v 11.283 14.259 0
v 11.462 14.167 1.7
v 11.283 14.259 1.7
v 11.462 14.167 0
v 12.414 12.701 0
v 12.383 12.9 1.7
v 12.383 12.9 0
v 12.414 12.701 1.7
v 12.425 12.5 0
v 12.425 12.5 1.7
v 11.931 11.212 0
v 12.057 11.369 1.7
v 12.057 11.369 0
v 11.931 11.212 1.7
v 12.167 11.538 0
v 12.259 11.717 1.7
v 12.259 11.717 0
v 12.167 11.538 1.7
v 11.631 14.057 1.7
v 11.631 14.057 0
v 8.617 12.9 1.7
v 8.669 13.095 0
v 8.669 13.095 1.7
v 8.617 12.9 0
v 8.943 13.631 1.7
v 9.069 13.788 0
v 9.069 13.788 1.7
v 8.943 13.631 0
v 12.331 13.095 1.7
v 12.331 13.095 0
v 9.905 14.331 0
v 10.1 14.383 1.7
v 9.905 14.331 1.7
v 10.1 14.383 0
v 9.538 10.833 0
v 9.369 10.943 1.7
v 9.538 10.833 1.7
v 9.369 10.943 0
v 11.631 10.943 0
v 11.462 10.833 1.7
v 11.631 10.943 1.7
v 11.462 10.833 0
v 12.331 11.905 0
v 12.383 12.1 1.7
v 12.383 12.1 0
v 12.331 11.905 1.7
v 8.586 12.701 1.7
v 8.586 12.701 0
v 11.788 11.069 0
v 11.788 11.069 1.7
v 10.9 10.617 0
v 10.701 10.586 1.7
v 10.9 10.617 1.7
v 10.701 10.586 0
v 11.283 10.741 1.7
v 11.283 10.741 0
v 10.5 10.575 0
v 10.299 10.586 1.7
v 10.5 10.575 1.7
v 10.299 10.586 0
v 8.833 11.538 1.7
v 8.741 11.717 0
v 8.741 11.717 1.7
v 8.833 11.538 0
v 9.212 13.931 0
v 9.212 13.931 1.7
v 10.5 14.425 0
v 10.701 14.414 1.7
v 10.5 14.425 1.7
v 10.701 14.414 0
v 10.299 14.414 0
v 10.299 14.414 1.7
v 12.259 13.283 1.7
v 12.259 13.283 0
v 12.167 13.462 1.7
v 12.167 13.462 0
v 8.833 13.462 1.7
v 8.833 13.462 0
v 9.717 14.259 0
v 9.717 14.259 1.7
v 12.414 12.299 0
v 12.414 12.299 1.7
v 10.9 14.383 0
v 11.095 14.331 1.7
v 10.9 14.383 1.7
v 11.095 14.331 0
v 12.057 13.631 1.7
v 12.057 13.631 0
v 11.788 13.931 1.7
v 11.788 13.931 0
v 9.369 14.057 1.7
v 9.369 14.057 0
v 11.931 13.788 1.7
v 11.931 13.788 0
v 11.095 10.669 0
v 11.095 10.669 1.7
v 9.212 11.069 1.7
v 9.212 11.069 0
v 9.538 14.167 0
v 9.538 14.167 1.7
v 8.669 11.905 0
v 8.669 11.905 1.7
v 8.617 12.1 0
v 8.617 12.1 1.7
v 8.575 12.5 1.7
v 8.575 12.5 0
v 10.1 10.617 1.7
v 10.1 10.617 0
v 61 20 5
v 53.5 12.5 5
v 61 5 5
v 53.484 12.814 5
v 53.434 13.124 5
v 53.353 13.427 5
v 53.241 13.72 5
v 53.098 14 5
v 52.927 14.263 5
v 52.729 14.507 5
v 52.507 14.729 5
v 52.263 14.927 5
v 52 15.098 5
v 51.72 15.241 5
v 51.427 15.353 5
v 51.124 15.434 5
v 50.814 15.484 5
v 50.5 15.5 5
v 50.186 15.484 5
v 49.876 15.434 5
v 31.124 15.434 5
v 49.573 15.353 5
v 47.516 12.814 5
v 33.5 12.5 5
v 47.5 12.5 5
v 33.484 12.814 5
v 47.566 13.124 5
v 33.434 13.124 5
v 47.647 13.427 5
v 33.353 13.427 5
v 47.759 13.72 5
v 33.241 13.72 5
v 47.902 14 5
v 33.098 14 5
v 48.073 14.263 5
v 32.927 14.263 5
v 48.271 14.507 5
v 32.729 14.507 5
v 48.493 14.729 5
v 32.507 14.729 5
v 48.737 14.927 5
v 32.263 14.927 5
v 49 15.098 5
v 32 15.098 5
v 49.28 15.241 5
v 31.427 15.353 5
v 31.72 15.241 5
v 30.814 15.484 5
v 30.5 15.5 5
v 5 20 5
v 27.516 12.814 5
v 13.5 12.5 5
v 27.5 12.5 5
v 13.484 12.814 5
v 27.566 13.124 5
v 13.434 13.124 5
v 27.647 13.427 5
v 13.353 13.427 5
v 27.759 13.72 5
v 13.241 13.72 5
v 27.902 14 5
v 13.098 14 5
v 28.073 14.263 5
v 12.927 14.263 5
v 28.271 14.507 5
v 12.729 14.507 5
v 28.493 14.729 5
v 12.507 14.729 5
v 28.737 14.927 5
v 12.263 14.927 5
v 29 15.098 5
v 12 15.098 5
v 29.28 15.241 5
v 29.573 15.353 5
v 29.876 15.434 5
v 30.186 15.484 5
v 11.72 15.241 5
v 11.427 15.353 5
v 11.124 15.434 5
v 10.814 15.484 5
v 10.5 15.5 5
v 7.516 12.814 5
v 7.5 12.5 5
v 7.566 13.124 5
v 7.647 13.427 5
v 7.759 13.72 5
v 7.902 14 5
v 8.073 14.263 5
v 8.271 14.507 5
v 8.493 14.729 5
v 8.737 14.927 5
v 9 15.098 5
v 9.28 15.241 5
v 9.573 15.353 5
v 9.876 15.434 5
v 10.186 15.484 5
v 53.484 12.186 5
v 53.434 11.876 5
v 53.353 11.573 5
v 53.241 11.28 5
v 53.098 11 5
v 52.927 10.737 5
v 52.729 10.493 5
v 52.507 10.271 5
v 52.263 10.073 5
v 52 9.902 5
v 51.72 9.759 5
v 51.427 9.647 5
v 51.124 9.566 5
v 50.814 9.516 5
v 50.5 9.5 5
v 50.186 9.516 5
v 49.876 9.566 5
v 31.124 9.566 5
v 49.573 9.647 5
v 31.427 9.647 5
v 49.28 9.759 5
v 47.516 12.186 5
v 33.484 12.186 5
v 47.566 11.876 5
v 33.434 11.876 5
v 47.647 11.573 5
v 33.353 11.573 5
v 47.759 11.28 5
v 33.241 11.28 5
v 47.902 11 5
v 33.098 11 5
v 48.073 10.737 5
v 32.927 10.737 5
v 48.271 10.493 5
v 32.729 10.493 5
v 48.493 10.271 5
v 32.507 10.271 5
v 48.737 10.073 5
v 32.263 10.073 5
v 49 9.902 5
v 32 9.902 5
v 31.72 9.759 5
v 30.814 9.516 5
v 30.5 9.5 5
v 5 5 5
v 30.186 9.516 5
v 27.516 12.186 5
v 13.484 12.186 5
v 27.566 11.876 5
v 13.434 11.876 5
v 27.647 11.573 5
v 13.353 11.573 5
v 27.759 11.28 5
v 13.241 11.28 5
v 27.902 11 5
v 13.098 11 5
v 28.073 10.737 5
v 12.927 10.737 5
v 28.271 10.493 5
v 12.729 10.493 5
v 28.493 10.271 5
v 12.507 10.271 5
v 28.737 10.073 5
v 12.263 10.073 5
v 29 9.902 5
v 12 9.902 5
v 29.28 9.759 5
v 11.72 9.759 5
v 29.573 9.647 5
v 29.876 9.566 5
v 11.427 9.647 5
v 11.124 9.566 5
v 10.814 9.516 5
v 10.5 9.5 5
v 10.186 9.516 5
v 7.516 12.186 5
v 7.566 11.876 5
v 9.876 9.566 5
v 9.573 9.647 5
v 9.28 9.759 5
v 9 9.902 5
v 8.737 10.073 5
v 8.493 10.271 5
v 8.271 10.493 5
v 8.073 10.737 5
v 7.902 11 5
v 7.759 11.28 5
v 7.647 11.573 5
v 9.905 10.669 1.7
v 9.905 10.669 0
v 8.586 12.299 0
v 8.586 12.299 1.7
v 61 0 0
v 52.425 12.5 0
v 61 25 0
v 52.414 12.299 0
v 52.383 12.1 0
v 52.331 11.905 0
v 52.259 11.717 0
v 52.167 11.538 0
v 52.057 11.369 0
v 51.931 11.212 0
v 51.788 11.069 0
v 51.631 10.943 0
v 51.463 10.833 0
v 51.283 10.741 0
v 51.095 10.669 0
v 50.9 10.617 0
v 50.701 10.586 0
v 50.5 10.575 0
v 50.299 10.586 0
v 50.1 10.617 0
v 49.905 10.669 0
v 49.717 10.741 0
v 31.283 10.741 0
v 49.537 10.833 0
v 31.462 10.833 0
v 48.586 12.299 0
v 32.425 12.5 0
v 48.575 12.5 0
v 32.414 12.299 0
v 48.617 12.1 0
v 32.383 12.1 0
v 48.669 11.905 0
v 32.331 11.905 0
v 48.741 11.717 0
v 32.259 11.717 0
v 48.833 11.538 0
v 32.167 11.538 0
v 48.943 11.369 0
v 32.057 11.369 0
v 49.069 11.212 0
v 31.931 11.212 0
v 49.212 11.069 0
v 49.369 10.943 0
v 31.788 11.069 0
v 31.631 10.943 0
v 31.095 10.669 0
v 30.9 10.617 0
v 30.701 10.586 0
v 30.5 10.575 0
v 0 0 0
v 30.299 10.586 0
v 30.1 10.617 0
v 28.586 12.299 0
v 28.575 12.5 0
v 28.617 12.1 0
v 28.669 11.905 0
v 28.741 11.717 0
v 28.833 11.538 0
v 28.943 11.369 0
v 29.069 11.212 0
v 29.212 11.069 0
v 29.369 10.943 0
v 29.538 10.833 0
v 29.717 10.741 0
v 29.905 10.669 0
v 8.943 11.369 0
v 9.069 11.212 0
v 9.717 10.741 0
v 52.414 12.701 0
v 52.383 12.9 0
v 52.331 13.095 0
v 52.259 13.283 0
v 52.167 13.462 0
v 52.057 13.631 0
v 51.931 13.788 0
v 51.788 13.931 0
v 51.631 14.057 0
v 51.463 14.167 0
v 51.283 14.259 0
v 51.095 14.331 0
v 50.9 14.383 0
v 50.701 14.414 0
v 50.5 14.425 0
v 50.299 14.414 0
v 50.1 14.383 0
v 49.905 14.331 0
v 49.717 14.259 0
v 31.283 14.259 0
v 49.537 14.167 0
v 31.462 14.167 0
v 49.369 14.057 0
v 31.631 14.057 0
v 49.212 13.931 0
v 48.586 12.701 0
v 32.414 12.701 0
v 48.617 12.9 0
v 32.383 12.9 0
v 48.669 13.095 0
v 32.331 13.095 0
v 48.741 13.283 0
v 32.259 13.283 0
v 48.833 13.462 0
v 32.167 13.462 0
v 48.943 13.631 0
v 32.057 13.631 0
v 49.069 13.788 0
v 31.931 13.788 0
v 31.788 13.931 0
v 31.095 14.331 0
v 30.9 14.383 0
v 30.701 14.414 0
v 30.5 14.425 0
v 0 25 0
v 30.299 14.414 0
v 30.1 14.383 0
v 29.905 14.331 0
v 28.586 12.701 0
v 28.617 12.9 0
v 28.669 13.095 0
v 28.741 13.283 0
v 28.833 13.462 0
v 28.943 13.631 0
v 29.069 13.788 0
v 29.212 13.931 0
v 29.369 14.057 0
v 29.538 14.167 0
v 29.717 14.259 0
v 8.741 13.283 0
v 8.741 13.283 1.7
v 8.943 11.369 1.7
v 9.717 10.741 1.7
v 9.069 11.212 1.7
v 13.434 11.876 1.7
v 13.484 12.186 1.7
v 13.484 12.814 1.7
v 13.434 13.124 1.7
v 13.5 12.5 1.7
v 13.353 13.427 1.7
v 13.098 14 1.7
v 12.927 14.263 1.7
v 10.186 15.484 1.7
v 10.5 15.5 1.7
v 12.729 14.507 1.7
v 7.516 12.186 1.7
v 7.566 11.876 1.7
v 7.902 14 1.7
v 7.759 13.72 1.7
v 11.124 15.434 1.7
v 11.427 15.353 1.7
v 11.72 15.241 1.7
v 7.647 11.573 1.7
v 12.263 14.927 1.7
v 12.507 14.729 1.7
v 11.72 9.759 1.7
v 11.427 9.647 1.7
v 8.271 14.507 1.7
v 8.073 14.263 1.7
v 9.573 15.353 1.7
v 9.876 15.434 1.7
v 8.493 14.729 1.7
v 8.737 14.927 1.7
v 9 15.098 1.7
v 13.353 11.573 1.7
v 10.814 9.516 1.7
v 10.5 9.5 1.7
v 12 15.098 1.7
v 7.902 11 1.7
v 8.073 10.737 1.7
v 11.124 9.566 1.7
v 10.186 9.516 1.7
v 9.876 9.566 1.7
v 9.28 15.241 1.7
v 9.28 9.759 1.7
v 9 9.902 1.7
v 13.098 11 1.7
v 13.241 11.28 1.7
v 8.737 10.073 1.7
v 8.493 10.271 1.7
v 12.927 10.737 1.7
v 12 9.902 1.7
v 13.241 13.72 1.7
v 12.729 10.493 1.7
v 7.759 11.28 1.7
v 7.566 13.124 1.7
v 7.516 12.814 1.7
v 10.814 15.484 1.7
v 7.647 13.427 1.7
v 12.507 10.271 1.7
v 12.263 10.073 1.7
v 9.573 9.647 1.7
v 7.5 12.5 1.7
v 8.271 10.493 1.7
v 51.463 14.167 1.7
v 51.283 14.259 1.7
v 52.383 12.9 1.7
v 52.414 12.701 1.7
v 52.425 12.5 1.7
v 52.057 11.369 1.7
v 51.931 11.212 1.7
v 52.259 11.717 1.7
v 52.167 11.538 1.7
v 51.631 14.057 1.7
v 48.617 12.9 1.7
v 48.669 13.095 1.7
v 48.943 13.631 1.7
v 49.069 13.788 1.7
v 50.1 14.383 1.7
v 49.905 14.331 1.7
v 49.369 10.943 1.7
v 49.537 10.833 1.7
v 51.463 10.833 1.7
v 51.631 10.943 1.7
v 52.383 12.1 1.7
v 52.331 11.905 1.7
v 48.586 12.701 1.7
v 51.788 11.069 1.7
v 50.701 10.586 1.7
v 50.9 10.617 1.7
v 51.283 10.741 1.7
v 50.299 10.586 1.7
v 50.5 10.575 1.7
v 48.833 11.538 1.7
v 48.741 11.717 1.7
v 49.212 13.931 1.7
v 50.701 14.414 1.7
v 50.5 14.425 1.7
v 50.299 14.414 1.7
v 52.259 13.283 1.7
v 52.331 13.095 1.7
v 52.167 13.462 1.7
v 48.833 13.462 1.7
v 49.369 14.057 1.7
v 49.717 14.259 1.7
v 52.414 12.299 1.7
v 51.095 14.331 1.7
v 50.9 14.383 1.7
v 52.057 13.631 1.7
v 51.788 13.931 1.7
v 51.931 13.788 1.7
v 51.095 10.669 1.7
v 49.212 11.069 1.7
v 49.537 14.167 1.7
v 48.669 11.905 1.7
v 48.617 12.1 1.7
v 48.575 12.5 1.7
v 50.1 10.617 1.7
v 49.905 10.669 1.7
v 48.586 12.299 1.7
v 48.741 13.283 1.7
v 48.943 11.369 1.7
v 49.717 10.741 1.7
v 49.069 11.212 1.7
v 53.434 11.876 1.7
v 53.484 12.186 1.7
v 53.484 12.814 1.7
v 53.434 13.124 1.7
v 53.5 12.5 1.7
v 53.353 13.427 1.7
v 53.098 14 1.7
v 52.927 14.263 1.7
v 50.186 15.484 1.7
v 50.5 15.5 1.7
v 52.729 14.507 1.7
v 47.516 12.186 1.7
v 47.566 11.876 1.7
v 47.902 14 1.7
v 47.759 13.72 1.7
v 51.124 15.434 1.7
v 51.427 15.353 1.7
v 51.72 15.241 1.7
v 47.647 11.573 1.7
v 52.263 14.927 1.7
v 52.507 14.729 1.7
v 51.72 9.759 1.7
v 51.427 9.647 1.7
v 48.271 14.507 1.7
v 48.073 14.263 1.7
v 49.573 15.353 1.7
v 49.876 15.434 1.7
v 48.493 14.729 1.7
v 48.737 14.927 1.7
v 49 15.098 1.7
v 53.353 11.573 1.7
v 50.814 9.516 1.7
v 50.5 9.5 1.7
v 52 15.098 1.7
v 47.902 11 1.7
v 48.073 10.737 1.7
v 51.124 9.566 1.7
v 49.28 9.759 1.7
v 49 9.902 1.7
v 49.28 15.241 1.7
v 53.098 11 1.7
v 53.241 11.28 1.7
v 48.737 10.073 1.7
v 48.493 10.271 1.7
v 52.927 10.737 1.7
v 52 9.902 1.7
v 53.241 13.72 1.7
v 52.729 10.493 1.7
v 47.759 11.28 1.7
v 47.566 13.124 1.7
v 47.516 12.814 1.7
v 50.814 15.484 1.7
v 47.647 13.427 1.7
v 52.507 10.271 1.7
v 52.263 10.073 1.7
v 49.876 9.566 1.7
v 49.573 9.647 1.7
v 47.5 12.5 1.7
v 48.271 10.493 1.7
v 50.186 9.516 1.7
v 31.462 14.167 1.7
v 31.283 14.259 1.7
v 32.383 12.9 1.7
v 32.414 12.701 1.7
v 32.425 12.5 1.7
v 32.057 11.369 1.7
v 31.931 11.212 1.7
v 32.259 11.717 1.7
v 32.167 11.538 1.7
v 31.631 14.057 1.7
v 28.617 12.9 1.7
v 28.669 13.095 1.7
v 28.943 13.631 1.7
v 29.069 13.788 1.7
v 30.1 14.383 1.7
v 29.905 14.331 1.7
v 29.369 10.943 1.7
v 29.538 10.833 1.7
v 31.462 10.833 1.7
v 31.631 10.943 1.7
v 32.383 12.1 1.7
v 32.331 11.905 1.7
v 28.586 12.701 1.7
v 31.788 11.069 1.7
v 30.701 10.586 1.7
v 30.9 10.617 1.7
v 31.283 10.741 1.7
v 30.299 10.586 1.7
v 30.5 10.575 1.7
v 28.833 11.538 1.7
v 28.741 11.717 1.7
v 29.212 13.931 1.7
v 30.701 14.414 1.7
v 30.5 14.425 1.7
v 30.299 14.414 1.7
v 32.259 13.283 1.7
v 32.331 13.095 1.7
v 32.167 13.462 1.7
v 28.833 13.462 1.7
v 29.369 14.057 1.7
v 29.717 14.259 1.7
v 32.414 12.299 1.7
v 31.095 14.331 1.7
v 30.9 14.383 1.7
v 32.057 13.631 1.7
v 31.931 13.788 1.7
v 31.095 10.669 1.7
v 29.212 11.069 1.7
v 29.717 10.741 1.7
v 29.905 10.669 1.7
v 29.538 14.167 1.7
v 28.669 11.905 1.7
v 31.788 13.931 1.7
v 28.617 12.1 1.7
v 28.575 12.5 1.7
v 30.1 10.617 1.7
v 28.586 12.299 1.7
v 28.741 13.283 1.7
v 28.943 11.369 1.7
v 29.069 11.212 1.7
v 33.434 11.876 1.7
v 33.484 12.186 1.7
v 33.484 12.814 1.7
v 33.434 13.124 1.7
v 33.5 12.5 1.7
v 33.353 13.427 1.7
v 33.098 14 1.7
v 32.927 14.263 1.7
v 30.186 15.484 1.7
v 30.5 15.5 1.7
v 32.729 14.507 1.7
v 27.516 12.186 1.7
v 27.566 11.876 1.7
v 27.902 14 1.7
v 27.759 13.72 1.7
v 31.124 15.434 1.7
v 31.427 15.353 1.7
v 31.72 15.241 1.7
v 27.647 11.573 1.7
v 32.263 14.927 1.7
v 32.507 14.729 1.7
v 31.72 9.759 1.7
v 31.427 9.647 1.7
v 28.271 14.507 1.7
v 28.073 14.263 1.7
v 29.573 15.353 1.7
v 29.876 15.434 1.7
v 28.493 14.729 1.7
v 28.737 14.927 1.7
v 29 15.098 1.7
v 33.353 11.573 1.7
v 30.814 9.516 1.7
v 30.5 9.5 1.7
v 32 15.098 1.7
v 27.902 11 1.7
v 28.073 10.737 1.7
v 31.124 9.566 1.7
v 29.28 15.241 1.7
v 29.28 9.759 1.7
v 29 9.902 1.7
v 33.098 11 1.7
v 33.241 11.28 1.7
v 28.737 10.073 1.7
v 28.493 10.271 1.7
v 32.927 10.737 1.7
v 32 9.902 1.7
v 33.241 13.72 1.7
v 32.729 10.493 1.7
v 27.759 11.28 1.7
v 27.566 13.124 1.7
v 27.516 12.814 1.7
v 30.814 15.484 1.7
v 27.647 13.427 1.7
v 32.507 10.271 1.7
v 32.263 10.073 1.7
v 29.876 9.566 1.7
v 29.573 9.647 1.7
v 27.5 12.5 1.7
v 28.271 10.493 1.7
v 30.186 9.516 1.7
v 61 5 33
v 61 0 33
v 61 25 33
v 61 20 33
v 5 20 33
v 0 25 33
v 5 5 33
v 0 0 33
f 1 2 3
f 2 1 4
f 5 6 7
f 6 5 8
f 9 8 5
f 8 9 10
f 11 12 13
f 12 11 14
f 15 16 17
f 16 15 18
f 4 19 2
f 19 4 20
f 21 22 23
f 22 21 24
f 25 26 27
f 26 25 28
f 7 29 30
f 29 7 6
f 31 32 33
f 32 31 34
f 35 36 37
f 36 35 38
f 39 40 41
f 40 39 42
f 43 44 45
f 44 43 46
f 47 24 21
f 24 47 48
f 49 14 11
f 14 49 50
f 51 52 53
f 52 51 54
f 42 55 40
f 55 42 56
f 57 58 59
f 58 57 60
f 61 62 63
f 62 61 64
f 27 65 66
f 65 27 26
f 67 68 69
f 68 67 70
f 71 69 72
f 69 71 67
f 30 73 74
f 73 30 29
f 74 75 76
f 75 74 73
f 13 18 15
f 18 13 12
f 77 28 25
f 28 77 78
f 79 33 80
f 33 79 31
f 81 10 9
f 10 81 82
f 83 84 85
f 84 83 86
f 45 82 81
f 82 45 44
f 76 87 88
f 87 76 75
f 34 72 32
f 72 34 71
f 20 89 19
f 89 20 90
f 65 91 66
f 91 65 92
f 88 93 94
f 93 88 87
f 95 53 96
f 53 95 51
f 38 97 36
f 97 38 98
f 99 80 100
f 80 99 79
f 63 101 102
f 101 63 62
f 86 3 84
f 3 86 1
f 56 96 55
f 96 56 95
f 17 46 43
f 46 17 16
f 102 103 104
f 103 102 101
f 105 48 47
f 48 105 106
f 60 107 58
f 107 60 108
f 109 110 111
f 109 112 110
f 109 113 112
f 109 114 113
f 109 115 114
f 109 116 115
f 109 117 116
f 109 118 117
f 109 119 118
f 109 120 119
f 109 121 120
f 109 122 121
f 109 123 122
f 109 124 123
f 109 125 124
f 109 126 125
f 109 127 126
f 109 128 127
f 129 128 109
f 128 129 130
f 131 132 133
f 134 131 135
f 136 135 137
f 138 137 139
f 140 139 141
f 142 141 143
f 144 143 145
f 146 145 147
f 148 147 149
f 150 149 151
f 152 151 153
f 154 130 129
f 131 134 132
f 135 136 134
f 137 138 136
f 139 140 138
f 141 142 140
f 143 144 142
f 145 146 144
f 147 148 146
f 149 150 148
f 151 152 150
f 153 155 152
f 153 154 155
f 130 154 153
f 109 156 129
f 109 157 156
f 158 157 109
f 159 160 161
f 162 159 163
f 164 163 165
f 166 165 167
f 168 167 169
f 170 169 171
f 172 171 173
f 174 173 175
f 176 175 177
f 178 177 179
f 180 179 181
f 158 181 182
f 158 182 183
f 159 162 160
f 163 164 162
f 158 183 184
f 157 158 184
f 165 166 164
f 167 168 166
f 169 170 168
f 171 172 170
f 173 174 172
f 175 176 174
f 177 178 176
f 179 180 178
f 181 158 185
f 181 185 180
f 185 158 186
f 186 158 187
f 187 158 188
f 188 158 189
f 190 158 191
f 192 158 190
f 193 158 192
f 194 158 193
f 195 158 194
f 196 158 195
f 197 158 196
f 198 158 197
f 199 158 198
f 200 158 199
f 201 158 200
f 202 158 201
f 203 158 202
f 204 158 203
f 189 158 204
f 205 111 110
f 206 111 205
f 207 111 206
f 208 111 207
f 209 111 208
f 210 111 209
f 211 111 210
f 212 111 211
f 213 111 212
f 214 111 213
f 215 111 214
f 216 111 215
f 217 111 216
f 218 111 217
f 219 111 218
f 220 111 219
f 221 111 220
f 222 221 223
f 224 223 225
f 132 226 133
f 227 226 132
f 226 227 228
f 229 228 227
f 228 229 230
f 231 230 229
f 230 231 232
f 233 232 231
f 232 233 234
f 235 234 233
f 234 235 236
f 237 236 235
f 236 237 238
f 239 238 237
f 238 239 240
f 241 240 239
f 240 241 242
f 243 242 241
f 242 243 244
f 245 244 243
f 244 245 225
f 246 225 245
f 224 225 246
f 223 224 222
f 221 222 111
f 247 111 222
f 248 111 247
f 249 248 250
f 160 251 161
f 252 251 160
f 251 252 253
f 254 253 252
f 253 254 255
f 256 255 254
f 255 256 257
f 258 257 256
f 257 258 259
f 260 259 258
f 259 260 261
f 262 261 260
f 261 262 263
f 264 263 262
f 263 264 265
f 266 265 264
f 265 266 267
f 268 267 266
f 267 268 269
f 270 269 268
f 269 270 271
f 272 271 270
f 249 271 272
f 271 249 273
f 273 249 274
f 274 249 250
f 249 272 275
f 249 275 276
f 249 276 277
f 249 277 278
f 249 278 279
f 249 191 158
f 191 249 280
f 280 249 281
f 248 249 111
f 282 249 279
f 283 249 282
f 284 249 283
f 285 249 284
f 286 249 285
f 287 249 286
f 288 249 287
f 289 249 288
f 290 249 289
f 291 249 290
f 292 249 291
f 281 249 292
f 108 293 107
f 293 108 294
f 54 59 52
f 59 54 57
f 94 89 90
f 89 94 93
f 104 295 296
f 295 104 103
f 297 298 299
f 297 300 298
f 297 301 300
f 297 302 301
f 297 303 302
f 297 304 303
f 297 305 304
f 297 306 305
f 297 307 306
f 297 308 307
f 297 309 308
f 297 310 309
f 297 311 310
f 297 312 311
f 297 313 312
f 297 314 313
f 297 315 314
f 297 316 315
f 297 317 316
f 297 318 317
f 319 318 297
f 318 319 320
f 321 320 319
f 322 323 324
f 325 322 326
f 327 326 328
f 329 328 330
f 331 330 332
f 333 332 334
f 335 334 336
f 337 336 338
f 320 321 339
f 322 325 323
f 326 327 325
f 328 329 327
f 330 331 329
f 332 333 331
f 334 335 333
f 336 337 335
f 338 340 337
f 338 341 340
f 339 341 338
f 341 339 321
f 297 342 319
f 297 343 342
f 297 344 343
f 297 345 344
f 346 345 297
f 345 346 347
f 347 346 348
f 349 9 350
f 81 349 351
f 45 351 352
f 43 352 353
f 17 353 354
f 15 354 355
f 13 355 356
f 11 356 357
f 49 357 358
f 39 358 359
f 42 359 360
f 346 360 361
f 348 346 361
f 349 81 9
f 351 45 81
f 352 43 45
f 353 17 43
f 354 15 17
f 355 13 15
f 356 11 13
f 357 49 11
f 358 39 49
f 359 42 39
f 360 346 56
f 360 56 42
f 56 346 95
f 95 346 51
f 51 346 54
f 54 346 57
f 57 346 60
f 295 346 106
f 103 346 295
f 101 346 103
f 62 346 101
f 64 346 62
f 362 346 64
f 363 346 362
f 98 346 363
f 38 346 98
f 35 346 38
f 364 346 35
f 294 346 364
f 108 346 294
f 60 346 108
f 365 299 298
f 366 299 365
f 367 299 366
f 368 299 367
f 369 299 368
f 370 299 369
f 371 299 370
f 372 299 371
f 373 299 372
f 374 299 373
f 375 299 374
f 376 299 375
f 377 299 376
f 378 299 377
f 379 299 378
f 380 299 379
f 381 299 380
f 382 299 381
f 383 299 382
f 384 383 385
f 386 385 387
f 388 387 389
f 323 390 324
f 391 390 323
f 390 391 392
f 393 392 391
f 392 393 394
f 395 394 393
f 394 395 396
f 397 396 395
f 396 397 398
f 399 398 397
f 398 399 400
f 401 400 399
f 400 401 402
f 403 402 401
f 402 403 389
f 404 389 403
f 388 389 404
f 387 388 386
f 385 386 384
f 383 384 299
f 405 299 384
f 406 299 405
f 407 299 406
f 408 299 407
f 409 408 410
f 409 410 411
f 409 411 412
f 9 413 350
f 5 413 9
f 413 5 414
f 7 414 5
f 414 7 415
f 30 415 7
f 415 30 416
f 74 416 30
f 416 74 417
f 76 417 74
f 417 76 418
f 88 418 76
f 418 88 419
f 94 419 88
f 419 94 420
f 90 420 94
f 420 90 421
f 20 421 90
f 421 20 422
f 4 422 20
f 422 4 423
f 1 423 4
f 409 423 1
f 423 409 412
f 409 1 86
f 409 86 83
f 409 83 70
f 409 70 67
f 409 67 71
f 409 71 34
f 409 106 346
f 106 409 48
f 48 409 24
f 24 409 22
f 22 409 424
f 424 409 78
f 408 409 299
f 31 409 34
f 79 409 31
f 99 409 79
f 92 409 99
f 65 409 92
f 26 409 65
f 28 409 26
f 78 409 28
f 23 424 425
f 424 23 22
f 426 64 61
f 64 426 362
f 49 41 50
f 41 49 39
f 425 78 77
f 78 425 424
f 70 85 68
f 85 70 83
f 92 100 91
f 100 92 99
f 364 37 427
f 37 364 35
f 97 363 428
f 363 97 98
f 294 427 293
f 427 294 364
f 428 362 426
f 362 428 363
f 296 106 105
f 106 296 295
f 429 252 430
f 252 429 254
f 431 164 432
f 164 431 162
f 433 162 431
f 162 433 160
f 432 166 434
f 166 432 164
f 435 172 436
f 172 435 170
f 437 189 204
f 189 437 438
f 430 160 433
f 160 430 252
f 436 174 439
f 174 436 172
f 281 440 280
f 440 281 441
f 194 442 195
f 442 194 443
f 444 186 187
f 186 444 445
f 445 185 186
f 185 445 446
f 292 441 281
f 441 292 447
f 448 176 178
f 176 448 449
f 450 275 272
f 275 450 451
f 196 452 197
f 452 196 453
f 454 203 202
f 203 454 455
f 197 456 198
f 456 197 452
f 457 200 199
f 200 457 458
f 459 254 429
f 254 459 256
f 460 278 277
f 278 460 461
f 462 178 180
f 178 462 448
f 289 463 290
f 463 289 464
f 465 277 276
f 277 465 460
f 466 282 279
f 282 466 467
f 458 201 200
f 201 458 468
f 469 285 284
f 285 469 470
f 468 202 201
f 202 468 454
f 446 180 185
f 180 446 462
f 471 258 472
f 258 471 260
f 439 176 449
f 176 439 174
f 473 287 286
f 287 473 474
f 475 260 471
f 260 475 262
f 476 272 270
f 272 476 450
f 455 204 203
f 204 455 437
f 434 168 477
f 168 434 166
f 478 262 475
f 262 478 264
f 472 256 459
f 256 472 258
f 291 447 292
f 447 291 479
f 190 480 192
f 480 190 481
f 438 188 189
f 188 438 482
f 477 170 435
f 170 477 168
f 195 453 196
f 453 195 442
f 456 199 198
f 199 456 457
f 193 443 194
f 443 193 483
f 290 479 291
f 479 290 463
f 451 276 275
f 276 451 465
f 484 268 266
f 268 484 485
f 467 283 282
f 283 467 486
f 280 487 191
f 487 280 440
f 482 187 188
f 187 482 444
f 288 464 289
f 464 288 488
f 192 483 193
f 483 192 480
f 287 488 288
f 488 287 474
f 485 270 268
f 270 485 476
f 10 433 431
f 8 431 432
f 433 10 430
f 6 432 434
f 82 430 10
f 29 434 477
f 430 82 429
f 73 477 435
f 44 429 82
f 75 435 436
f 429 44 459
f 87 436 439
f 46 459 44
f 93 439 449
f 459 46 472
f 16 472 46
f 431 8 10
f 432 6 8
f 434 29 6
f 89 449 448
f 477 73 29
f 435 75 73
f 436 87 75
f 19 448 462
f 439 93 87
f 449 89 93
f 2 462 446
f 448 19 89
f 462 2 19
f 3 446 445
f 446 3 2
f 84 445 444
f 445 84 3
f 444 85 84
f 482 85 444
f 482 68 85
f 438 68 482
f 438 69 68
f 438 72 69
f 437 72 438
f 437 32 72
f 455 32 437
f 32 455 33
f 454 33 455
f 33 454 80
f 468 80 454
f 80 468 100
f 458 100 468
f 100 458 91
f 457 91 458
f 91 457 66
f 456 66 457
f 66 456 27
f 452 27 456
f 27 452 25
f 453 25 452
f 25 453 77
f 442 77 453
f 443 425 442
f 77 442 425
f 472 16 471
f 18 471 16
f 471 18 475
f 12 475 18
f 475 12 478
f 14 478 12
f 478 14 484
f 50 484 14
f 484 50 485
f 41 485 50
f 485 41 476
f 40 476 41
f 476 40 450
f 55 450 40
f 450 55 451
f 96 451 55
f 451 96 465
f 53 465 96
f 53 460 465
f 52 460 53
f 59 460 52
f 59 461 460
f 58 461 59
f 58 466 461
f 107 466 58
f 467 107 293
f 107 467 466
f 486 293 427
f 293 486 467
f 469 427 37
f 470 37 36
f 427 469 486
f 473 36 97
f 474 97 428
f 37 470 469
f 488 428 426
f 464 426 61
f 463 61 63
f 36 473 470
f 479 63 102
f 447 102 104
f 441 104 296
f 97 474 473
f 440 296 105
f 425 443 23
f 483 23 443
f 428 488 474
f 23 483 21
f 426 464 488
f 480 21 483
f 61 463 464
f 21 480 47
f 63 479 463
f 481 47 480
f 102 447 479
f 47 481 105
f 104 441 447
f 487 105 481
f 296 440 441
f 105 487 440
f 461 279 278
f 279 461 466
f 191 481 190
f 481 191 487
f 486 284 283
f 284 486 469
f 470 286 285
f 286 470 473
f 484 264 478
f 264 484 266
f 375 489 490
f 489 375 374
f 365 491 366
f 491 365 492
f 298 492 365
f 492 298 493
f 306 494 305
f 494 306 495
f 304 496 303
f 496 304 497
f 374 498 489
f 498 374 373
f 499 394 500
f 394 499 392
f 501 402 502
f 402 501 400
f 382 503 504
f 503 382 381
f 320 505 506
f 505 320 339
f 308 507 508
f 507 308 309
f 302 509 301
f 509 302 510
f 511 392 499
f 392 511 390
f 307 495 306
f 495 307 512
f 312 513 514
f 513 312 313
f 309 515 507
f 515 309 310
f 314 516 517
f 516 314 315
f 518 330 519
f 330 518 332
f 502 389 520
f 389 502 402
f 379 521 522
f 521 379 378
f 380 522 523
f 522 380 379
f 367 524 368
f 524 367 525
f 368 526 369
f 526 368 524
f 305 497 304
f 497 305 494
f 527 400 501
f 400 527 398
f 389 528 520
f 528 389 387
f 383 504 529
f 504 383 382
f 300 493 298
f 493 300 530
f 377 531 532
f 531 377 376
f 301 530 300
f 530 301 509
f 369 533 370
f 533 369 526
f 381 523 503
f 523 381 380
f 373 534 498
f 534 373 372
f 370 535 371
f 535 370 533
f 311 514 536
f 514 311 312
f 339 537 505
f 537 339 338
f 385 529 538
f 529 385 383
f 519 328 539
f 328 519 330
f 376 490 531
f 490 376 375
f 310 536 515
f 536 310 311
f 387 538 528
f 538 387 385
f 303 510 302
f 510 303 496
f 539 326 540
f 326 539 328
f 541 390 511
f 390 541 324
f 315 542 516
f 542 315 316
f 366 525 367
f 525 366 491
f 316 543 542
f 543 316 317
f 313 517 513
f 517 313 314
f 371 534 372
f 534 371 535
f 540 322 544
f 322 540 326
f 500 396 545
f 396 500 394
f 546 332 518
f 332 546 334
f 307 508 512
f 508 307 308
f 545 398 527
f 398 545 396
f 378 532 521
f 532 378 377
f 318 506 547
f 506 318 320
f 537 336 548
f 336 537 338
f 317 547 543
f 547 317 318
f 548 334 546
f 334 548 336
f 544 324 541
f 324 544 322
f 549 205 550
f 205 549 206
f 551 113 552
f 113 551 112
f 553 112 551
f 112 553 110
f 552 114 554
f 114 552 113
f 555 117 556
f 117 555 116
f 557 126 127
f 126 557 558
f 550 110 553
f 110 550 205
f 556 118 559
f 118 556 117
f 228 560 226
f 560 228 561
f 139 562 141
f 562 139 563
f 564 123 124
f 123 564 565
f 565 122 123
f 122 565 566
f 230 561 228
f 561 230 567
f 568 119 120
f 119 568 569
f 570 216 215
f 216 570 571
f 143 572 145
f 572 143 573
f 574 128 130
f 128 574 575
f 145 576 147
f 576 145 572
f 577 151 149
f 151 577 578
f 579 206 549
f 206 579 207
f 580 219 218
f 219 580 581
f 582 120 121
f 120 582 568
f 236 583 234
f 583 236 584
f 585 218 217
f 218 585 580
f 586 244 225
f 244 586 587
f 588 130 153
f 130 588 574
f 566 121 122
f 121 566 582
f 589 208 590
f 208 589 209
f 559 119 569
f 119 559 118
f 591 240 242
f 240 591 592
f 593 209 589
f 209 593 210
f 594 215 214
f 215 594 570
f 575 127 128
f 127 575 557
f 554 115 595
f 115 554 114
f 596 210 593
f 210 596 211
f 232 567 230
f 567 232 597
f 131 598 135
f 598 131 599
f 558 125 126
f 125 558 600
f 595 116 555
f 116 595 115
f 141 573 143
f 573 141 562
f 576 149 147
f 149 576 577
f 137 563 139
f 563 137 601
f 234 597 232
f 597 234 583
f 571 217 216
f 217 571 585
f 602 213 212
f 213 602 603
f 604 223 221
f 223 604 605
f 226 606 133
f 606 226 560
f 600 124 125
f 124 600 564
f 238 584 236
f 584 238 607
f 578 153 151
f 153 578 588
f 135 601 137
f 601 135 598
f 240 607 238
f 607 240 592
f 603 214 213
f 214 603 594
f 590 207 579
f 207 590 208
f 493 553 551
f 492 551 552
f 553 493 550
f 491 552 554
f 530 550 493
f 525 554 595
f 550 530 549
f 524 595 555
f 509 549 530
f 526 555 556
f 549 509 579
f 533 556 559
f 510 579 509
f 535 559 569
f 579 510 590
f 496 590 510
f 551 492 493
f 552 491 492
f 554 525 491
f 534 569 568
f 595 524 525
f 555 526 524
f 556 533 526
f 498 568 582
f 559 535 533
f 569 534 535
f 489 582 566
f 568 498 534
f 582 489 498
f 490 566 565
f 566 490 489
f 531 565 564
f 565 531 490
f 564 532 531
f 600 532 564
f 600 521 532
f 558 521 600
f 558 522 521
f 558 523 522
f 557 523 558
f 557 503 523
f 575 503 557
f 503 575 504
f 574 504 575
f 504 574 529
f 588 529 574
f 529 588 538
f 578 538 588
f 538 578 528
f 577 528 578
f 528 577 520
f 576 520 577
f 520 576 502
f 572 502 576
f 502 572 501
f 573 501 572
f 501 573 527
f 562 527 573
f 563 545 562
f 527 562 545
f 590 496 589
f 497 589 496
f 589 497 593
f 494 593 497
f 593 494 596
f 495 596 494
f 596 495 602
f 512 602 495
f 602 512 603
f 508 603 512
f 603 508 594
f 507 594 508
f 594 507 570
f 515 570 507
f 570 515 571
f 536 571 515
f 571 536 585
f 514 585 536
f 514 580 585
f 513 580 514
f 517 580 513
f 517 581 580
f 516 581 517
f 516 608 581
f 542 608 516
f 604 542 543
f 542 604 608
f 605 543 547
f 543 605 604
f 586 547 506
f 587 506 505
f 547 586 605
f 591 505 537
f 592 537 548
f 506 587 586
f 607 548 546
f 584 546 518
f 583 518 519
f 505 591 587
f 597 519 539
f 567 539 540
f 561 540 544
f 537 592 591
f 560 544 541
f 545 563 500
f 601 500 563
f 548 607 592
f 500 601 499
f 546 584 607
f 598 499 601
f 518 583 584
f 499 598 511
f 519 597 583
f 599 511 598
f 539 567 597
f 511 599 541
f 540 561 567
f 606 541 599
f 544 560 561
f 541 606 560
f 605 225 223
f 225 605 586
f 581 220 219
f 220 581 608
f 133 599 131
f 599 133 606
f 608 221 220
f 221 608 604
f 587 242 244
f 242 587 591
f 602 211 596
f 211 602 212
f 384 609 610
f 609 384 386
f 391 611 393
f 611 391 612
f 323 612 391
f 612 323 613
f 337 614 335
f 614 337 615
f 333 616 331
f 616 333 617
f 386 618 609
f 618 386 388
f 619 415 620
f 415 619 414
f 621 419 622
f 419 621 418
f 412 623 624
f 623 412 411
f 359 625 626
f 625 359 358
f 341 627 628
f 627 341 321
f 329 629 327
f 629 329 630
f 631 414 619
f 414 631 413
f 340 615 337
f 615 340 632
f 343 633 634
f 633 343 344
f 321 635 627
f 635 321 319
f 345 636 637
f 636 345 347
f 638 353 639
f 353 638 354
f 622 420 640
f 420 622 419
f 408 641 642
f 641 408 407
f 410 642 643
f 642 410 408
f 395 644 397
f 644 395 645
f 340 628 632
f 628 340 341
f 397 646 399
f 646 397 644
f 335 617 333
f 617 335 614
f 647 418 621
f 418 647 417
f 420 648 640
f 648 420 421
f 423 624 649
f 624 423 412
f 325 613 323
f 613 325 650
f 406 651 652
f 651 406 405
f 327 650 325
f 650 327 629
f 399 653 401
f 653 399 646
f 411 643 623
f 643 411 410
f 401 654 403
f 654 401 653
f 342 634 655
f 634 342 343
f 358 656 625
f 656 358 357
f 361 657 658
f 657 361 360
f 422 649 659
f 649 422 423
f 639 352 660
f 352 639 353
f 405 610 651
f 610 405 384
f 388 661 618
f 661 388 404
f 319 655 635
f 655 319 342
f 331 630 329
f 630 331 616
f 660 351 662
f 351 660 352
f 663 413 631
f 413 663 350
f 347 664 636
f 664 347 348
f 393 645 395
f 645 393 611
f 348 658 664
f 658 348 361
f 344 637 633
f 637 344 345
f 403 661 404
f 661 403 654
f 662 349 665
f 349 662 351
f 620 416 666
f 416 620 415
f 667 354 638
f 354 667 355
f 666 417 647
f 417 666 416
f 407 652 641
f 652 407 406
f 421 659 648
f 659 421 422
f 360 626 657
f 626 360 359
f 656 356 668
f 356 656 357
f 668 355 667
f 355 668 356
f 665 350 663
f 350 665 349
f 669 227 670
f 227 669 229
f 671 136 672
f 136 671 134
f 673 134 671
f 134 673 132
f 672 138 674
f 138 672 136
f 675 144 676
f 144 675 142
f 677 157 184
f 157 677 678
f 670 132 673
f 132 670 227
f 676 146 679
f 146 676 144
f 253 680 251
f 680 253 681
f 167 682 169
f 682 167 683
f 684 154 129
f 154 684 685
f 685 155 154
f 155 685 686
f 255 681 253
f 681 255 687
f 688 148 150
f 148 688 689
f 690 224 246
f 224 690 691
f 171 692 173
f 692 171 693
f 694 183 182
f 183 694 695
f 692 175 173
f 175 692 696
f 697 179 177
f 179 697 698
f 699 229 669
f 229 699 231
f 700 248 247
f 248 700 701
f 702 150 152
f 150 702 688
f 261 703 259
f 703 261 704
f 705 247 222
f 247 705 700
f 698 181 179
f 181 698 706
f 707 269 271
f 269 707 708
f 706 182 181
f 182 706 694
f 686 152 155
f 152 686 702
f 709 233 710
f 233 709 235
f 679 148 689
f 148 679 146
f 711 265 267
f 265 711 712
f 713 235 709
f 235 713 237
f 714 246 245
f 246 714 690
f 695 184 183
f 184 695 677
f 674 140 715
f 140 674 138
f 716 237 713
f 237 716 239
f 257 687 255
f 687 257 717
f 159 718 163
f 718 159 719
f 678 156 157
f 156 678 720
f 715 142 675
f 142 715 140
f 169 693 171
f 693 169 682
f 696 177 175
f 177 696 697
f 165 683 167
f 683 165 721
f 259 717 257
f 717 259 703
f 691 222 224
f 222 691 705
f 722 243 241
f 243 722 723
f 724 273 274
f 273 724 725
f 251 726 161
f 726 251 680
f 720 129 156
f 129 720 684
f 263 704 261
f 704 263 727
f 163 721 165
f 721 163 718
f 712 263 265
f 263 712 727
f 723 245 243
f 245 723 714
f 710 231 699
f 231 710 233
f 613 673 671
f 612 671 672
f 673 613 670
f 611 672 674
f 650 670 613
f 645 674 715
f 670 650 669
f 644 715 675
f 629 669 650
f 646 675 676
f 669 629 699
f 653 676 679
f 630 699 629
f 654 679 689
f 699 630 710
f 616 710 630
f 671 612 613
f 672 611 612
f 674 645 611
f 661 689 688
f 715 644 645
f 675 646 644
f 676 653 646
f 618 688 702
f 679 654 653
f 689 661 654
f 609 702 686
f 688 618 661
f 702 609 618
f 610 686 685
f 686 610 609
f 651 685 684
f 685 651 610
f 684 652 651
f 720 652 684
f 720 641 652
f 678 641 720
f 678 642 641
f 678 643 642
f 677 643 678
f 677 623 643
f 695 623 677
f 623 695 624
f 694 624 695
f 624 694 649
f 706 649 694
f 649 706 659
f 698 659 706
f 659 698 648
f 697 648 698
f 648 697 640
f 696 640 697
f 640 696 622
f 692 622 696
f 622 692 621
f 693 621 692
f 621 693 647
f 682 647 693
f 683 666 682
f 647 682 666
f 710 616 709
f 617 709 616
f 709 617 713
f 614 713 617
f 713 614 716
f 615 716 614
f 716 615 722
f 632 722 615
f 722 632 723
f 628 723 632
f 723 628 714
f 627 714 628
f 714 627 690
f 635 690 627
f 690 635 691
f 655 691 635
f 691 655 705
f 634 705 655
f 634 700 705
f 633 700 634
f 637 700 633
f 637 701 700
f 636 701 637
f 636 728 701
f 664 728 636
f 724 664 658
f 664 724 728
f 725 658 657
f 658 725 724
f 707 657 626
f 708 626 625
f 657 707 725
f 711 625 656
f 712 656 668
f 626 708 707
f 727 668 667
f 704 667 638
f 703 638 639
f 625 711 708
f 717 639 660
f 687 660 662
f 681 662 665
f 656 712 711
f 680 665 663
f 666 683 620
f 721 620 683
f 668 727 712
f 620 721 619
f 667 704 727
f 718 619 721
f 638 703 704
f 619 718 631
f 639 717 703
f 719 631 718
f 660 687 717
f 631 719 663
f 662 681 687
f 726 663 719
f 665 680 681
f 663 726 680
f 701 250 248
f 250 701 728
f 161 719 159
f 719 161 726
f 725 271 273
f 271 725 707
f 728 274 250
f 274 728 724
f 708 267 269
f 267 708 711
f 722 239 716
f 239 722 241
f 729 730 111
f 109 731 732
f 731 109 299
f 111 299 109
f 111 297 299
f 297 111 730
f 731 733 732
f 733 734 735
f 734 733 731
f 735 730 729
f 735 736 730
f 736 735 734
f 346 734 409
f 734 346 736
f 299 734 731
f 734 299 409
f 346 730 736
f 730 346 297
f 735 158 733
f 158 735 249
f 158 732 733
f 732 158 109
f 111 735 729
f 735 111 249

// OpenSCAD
// file: metric_screw_sizes.scad
//sizes for metric screws that work
m3_clearance = 3.85;
m3_tight = 3.5;
m3_cap_clear = 6;
m3_cap_depth = 3.3;
m3_nut_clear = 7;
// main file
//holder for blomiky lipo 1000 mah 7.4v battery
$fn = 60;
battery_height = 15;
battery_depth = 31; //wired end ~34mm
battery_width = 56;
mount_thickness = 5;
mount_x_center = (mount_thickness + battery_width)/2;
mount_y_center = (2*mount_thickness + battery_height)/2;

include <metric_screw_sizes.scad>

difference(){
    cube([battery_width + mount_thickness, battery_height + 2*mount_thickness, battery_width/2 + mount_thickness]);
    translate([mount_thickness, mount_thickness, mount_thickness])
        cube([battery_width, battery_height, battery_width/2]);
    //mounting holes
    translate([mount_x_center - 20, mount_y_center, 0]){
        cylinder(h = mount_thickness, r = m3_clearance/2);
        translate([0, 0, mount_thickness - m3_cap_depth])
            cylinder(h = m3_cap_depth, r = m3_cap_clear/2);
    }
        translate([mount_x_center + 20, mount_y_center, 0]){
        cylinder(h = mount_thickness, r = m3_clearance/2);
        translate([0, 0, mount_thickness - m3_cap_depth])
            cylinder(h = m3_cap_depth, r = m3_cap_clear/2);
    }
        translate([mount_x_center, mount_y_center, 0]){
        cylinder(h = mount_thickness, r = m3_clearance/2);
        translate([0, 0, mount_thickness - m3_cap_depth])
            cylinder(h = m3_cap_depth, r = m3_cap_clear/2);
    }
}
